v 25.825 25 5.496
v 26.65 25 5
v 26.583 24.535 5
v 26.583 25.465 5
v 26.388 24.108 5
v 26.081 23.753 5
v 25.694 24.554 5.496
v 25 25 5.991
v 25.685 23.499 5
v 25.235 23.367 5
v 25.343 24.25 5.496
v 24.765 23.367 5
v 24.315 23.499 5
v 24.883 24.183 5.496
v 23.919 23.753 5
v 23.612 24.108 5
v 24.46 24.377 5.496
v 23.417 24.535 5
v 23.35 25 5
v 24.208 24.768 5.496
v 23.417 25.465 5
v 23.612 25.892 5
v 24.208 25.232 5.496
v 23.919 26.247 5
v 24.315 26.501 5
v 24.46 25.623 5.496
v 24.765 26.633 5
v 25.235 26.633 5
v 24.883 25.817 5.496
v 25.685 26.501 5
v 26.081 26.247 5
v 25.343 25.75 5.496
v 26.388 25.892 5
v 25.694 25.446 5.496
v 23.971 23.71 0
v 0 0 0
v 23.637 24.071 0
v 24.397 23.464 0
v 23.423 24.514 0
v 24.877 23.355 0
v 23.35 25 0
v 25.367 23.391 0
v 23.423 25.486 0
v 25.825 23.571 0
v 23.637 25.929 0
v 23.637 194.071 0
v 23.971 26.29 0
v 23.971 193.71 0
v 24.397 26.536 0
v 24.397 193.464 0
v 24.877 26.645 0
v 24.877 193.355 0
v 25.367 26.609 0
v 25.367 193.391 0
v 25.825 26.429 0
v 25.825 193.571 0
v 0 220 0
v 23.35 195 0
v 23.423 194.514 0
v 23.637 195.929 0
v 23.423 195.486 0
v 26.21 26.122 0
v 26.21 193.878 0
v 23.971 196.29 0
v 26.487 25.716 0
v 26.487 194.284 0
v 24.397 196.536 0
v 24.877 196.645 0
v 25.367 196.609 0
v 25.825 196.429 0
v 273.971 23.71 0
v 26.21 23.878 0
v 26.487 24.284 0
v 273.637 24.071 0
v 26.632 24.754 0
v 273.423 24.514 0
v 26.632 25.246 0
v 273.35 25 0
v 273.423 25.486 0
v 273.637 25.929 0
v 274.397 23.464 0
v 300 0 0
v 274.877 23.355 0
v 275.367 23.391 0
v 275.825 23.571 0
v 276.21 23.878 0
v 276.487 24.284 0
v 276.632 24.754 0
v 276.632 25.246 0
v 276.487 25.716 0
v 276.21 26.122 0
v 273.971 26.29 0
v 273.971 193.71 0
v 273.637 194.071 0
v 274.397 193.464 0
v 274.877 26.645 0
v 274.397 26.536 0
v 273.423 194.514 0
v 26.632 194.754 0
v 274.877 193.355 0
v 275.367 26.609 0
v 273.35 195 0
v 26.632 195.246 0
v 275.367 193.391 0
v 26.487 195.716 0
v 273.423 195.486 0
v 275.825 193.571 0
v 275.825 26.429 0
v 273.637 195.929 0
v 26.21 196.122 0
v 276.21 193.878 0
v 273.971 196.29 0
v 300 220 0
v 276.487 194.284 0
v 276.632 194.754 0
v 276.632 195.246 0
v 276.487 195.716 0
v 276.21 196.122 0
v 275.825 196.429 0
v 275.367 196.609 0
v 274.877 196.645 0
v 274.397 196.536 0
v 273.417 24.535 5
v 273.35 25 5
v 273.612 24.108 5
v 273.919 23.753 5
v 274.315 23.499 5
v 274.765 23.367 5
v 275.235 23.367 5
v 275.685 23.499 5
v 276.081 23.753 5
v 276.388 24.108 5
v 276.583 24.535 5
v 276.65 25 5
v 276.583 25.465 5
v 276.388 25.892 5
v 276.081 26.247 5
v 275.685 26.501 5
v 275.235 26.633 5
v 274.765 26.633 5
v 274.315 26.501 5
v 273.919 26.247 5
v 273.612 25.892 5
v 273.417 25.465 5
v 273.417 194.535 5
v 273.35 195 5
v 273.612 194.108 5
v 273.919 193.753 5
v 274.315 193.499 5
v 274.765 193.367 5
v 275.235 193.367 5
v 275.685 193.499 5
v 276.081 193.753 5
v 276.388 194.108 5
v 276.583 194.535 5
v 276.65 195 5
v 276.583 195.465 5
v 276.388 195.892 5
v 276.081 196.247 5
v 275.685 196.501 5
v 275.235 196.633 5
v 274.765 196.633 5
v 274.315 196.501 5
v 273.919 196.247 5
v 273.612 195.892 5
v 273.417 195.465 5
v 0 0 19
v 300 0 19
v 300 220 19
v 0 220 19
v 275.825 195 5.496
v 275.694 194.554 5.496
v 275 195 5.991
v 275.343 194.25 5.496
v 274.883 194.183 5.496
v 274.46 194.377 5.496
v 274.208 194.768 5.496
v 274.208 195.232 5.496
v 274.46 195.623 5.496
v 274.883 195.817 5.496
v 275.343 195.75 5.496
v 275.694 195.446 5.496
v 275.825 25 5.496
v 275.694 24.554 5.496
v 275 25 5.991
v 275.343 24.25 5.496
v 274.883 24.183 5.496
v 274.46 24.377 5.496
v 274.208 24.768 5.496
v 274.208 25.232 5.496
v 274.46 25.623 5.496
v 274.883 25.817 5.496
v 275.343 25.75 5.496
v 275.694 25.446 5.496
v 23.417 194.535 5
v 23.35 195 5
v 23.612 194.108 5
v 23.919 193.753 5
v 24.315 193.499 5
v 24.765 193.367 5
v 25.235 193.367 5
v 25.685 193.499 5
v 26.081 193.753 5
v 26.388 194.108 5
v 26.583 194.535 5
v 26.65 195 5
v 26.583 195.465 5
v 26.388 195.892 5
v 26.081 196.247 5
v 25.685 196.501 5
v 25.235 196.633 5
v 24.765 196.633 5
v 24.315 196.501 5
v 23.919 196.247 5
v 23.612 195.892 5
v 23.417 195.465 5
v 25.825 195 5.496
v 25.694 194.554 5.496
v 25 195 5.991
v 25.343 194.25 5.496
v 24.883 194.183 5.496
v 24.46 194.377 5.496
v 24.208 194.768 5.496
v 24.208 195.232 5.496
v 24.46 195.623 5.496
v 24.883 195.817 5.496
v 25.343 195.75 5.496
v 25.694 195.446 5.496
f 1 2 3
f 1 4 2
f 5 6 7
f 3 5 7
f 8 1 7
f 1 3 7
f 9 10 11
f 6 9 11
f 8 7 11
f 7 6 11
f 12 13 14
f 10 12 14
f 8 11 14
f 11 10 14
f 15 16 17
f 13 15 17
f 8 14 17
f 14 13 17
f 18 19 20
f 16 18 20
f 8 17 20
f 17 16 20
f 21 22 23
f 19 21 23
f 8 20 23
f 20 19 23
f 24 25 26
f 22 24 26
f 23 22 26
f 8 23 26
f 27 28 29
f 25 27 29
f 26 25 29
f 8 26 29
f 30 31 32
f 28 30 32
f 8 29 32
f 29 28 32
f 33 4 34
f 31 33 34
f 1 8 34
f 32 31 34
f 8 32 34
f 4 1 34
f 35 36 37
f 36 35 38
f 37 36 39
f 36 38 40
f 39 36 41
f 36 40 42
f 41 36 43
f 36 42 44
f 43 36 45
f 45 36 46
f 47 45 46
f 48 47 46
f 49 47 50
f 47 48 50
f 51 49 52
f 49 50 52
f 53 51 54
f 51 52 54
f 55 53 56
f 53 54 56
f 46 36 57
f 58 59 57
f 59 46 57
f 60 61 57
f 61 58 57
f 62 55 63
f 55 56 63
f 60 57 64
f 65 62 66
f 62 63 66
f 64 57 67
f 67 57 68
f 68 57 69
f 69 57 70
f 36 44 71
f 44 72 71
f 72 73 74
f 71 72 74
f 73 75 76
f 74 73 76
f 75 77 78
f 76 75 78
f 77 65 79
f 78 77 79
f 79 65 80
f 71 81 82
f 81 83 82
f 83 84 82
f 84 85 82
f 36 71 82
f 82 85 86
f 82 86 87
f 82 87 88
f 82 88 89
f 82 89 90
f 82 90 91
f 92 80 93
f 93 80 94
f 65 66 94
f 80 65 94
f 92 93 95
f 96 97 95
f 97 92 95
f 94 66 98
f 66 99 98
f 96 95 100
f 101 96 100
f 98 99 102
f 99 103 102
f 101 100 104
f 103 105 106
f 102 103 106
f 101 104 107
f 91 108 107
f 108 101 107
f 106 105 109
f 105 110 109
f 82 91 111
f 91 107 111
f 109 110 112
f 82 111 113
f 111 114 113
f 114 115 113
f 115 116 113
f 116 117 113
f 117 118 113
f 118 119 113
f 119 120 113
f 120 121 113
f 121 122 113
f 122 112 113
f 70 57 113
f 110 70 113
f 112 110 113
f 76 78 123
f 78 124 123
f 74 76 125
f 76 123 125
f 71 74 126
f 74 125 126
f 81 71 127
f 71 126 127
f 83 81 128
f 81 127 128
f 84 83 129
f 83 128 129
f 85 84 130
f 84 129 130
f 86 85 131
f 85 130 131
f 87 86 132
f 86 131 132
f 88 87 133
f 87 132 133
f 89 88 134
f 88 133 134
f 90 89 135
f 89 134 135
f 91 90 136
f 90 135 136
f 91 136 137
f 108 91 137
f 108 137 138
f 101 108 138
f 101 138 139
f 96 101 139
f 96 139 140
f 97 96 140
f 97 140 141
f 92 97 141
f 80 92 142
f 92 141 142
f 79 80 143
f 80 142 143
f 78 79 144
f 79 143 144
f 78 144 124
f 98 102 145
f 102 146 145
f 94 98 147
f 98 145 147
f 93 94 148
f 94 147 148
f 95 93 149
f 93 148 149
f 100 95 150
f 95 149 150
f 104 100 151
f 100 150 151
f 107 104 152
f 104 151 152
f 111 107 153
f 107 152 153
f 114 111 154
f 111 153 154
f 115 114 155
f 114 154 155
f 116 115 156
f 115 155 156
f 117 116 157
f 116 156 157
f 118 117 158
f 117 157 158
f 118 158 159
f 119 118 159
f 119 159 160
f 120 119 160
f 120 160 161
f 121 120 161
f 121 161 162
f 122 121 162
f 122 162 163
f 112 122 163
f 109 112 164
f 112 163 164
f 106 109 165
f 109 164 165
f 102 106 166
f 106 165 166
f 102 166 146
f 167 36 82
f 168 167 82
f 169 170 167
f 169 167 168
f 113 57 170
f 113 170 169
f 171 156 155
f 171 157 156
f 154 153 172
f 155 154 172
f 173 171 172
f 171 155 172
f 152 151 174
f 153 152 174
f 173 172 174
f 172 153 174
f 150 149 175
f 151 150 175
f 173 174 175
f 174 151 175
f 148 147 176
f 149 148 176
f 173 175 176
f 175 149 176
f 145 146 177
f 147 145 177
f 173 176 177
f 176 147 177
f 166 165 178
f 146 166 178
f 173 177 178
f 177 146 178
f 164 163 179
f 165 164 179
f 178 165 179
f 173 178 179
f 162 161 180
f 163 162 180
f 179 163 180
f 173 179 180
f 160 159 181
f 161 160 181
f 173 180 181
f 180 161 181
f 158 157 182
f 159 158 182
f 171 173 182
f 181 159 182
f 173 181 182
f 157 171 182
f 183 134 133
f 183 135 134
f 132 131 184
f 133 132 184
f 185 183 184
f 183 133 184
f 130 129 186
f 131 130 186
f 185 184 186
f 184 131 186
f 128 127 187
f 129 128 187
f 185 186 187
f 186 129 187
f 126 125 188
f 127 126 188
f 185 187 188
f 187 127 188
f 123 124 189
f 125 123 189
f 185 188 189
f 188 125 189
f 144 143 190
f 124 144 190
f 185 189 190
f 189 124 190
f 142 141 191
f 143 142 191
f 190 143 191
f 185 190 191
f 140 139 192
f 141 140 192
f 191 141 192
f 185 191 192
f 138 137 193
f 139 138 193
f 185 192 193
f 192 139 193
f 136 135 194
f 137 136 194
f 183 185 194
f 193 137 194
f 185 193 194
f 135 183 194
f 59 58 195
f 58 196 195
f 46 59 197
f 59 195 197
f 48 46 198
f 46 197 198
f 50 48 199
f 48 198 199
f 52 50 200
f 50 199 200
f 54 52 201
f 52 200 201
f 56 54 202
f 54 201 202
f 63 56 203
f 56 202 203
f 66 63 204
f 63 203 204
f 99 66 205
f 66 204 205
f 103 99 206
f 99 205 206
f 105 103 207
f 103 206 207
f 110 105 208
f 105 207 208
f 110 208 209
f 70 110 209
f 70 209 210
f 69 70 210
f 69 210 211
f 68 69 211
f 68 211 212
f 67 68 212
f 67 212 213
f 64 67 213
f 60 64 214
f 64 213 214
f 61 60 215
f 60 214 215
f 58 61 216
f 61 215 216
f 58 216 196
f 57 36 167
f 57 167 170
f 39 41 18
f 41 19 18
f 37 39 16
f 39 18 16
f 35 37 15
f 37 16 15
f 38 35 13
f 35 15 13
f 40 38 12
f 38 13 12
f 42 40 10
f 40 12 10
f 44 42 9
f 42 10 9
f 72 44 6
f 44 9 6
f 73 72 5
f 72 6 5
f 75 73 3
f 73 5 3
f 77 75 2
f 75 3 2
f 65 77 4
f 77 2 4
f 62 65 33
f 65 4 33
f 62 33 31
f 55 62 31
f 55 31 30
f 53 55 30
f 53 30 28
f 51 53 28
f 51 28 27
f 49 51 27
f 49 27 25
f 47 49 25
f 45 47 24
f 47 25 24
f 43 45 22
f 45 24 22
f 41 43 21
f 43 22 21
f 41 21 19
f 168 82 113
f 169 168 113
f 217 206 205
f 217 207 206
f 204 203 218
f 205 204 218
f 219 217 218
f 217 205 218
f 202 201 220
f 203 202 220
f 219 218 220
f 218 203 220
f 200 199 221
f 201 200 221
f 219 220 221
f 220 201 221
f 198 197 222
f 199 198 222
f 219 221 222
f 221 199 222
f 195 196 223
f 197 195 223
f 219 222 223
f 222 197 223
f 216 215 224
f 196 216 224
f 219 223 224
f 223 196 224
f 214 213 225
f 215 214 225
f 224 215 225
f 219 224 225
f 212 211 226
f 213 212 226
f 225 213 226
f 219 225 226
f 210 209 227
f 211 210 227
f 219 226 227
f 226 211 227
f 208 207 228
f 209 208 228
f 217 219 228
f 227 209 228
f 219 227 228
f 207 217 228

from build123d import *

# Parameters (mm, degrees)
F0_W     = 300
F0_H     = 220
F1_DEPTH = 19
F3_D     = 3.3
F3_DEPTH = 5
F3_TIP   = 0.9914200214


with BuildPart() as f1:
    # F0 (on Top) → F1 (new body)
    with BuildSketch(Plane.XY):
        with Locations((150, 110)):
            Rectangle(F0_W, F0_H)
    extrude(amount=F1_DEPTH)

    # F3
    with Locations(Plane(origin=(0, 0, 0), x_dir=(1, 0, 0), z_dir=(0, 0, -1))):
        with Locations((25, -25), (25, -195), (275, -195), (275, -25)):
            Hole(F3_D / 2, depth=F3_DEPTH)
            with Locations((0, 0, -(F3_DEPTH + F3_TIP / 2))):  # 118° drill point
                Cone(0, F3_D / 2, F3_TIP, mode=Mode.SUBTRACT)


solid = f1.part
